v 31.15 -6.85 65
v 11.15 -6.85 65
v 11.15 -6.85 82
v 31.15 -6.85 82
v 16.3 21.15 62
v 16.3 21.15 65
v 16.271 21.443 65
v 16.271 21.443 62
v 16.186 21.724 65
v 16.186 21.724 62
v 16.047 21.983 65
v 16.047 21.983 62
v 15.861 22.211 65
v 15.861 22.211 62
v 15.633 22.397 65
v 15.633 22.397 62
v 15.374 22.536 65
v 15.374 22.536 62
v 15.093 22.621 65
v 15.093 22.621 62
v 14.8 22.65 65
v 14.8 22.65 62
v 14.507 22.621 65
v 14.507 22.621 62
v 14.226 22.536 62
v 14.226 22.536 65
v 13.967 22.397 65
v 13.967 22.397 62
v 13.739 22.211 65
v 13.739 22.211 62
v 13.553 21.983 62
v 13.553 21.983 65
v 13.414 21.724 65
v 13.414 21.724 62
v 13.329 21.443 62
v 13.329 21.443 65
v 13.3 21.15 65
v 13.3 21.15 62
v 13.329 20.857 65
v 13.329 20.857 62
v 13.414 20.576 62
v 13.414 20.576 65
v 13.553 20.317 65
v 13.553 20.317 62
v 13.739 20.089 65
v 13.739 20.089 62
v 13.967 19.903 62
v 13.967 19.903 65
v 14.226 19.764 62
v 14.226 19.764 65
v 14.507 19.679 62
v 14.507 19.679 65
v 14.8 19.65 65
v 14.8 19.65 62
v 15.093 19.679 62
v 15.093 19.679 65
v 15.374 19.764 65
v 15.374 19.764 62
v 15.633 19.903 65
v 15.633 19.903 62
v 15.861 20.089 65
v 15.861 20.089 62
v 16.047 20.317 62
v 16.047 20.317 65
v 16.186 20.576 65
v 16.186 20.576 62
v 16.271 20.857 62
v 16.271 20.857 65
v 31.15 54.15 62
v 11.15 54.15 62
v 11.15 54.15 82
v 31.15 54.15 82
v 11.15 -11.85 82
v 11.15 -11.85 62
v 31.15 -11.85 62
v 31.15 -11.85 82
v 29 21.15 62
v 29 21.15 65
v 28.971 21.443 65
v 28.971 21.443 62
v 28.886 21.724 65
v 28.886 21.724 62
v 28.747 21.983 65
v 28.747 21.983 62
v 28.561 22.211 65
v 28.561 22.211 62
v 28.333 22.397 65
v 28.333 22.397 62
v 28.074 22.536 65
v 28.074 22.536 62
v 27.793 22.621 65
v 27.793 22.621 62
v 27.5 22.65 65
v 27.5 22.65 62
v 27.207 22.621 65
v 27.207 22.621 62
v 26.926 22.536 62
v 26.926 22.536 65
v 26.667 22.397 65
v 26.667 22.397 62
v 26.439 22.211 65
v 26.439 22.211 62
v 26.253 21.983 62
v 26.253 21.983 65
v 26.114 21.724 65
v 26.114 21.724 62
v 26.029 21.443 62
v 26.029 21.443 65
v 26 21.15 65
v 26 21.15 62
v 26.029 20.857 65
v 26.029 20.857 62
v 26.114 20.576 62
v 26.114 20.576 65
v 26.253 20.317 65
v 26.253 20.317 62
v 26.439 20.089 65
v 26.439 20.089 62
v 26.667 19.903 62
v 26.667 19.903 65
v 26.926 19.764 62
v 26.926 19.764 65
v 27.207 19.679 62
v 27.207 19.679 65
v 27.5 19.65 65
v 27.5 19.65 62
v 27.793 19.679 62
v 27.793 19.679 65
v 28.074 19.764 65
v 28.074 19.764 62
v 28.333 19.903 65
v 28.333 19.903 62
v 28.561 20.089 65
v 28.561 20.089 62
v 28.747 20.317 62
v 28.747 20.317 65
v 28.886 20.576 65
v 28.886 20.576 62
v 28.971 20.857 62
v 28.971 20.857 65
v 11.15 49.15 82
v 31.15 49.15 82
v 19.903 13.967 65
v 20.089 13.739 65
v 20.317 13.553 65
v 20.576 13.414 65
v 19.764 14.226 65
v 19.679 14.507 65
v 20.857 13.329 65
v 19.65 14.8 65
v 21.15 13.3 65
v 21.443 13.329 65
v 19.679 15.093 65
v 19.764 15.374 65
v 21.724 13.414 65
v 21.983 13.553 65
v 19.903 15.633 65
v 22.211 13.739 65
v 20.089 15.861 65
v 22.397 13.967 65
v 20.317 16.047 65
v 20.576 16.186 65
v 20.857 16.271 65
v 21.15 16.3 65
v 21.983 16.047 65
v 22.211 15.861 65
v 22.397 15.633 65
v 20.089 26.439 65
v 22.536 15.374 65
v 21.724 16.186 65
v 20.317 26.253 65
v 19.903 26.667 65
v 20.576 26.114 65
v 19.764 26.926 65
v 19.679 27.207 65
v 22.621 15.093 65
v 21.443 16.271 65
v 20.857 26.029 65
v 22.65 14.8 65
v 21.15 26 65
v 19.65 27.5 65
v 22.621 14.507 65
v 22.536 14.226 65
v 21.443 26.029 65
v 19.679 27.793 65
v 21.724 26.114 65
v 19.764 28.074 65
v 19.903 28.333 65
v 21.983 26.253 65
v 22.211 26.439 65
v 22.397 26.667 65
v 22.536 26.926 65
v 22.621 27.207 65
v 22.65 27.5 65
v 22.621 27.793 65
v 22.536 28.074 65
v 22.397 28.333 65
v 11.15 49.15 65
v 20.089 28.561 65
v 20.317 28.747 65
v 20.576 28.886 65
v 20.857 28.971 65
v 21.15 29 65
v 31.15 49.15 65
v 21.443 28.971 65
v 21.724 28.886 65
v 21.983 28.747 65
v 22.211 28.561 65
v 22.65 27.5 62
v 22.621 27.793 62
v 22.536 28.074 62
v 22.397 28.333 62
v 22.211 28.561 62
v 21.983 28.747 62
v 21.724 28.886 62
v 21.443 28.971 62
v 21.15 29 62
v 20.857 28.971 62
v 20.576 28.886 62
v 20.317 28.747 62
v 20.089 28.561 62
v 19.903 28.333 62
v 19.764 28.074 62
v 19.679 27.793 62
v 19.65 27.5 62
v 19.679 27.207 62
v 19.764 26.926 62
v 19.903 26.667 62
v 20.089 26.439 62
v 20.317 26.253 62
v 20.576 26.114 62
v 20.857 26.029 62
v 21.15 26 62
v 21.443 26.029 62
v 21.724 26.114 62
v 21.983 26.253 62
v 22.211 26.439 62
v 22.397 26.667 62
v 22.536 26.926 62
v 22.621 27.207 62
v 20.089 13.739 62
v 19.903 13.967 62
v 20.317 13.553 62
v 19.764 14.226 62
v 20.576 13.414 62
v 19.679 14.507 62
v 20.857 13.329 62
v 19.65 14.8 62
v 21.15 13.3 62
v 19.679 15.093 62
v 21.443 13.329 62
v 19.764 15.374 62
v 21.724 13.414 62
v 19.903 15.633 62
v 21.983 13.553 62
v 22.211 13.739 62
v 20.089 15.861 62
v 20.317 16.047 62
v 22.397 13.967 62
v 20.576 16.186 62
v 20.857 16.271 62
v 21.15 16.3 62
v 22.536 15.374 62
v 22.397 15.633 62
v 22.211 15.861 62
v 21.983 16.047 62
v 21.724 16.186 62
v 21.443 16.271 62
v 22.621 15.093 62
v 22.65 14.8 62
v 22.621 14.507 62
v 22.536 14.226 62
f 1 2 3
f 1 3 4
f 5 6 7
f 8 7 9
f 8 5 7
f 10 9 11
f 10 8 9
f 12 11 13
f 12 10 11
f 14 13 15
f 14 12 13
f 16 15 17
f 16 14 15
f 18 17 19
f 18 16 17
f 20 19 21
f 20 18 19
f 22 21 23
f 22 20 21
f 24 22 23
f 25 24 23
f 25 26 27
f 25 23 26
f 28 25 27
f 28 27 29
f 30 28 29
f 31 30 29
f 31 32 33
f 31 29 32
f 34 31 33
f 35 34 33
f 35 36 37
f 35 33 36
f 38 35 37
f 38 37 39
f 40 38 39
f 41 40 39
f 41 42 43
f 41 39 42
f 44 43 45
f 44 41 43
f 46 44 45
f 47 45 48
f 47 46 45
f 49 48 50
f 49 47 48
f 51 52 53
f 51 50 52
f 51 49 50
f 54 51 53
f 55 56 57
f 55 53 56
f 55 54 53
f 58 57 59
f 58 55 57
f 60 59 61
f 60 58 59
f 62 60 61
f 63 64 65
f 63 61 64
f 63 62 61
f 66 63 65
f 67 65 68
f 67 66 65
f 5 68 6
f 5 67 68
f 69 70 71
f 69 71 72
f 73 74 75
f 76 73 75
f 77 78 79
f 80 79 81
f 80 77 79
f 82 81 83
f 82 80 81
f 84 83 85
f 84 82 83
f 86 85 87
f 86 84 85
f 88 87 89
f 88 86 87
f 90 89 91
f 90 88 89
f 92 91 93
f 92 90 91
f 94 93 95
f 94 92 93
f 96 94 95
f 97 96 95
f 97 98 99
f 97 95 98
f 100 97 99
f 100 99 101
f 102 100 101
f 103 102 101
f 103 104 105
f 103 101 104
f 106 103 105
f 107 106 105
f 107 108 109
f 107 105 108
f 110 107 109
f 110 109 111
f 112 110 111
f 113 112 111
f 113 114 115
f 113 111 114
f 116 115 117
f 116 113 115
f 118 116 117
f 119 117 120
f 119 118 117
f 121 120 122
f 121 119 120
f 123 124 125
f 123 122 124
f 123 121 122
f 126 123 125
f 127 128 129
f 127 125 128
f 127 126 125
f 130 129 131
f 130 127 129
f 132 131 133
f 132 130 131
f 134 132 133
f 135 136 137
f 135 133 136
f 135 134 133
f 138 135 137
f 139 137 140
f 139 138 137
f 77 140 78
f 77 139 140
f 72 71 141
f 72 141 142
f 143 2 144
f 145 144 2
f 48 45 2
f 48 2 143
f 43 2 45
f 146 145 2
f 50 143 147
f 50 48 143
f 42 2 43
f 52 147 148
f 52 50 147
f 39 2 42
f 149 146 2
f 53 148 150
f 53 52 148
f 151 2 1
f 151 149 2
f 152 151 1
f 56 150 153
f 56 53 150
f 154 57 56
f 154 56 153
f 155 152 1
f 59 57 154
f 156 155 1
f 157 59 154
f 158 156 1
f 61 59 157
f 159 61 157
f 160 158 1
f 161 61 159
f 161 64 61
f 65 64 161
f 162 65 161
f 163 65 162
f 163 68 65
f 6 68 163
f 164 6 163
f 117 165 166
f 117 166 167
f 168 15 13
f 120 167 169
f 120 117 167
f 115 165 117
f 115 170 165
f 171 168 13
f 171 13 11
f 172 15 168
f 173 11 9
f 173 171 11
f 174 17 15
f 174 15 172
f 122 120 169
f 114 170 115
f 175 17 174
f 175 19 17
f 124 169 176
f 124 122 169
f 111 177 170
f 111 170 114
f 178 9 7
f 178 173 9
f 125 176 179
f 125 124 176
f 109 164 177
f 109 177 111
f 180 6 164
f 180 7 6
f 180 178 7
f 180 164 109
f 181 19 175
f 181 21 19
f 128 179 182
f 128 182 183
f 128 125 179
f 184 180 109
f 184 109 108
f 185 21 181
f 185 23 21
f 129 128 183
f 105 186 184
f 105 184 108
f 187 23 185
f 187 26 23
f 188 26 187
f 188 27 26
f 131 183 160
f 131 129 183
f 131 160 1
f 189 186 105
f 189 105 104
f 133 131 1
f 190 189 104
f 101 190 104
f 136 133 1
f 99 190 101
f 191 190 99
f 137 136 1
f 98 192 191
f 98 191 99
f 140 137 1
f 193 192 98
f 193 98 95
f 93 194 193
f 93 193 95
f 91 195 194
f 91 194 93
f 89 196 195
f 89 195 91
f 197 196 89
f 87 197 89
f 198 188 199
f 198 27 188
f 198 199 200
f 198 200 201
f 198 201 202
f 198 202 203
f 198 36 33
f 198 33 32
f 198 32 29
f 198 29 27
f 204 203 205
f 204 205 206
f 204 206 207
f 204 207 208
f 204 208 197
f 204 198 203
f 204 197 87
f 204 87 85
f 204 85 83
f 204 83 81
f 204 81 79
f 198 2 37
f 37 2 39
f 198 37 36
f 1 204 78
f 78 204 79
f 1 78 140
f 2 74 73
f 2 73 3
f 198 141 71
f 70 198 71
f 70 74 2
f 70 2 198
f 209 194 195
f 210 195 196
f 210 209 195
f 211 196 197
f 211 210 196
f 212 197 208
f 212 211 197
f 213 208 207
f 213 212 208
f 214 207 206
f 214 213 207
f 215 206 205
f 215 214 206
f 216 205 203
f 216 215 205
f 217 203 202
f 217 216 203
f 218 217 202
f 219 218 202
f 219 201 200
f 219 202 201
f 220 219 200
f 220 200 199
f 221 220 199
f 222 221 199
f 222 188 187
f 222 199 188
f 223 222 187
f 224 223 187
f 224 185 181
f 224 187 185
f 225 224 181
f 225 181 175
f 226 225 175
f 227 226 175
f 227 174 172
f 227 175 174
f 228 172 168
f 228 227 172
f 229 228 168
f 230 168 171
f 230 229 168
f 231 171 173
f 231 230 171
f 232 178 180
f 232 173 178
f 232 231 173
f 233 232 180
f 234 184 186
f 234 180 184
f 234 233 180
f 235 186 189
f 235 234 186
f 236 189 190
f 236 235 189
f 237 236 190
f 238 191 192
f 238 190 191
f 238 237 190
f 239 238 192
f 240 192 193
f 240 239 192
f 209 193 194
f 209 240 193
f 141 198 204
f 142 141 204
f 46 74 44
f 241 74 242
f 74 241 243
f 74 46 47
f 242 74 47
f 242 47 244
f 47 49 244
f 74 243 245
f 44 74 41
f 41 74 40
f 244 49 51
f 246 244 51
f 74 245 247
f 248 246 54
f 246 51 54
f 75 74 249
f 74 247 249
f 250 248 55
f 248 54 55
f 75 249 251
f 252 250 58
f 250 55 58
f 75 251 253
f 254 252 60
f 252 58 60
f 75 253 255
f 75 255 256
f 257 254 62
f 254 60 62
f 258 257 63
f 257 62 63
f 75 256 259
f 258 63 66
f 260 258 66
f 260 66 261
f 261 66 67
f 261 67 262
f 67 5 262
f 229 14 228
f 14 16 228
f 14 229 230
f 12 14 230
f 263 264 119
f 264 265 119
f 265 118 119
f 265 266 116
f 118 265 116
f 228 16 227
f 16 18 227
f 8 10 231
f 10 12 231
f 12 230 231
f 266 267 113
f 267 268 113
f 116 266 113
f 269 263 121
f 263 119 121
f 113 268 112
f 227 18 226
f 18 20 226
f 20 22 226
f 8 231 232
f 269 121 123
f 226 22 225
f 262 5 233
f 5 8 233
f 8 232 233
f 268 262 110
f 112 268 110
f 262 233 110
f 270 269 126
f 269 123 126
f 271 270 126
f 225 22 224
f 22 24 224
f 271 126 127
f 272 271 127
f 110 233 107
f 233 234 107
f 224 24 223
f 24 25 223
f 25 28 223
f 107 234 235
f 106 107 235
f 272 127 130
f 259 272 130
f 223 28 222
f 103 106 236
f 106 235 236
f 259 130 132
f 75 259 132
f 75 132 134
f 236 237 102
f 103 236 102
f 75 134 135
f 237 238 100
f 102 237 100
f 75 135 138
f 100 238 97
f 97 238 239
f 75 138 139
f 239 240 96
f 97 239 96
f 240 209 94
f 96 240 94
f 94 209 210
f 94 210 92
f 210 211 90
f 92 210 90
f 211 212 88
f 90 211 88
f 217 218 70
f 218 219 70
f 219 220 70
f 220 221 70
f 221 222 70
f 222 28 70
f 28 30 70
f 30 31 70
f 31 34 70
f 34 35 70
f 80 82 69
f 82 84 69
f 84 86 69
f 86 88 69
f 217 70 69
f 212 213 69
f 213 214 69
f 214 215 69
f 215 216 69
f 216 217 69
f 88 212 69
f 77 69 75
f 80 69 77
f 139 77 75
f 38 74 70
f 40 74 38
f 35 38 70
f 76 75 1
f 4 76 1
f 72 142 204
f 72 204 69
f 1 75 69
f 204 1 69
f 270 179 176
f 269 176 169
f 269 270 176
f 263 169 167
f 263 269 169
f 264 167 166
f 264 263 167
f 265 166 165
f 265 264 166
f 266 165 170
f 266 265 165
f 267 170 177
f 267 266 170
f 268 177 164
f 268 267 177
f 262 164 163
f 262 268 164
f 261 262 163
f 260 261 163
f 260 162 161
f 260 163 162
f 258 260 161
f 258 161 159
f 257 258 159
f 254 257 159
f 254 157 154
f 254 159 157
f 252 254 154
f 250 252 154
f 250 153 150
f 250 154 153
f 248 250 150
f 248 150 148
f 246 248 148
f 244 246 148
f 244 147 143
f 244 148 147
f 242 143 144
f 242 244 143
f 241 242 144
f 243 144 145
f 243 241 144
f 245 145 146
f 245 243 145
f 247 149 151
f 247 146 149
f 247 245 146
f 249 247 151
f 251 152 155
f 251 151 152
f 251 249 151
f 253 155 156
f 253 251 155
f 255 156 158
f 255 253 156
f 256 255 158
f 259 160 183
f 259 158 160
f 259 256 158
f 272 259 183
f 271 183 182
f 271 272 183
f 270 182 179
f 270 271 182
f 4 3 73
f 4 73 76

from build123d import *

# Parameters (mm, degrees)
CYLINDER002_R     = 1.5
CYLINDER002_DEPTH = 10
CYLINDER003_R     = 1.5
CYLINDER003_DEPTH = 10
CYLINDER004_R     = 1.5
CYLINDER004_DEPTH = 10
CYLINDER001_R     = 1.5
CYLINDER001_DEPTH = 10
BOX003_W          = 20
BOX003_H          = 65
BOX003_DEPTH      = 3
BOX002_W          = 20
BOX002_H          = 5
BOX002_DEPTH      = 20
BOX001_W          = 20
BOX001_H          = 5
BOX001_DEPTH      = 20


with BuildPart() as h2:
    # Cylinder002 → Cylinder002 (new body)
    with BuildSketch(Plane(origin=(16.35, 32.5, 0), x_dir=(1, 0, 0), z_dir=(0, 0, 1))):
        Circle(CYLINDER002_R)
    extrude(amount=CYLINDER002_DEPTH)


with BuildPart() as h3:
    # Cylinder003 → Cylinder003 (new body)
    with BuildSketch(Plane(origin=(10, 38.85, 0), x_dir=(1, 0, 0), z_dir=(0, 0, 1))):
        Circle(CYLINDER003_R)
    extrude(amount=CYLINDER003_DEPTH)


with BuildPart() as h4:
    # Cylinder004 → Cylinder004 (new body)
    with BuildSketch(Plane(origin=(10, 26.15, 0), x_dir=(1, 0, 0), z_dir=(0, 0, 1))):
        Circle(CYLINDER004_R)
    extrude(amount=CYLINDER004_DEPTH)


with BuildPart() as h1:
    # Cylinder001 → Cylinder001 (new body)
    with BuildSketch(Plane(origin=(3.65, 32.5, 0), x_dir=(1, 0, 0), z_dir=(0, 0, 1))):
        Circle(CYLINDER001_R)
    extrude(amount=CYLINDER001_DEPTH)


with BuildPart() as cut003:
    # Box003 → Box003 (new body)
    with BuildSketch(Plane.XY):
        with Locations((10, 32.5)):
            Rectangle(BOX003_W, BOX003_H)
    extrude(amount=BOX003_DEPTH)

    # Cut: cut H1
    add(h1.part, mode=Mode.SUBTRACT)

    # Cut001: cut H4
    add(h4.part, mode=Mode.SUBTRACT)

    # Cut002: cut H3
    add(h3.part, mode=Mode.SUBTRACT)

    # Cut003: cut H2
    add(h2.part, mode=Mode.SUBTRACT)


with BuildPart() as arm2:
    # Box002 → Box002 (new body)
    with BuildSketch(Plane(origin=(0, 60.5, 0), x_dir=(1, 0, 0), z_dir=(0, 0, 1))):
        with Locations((10, 2.5)):
            Rectangle(BOX002_W, BOX002_H)
    extrude(amount=BOX002_DEPTH)


with BuildPart() as gripper:
    # Box001 → Box001 (new body)
    with BuildSketch(Plane(origin=(0, -0.5, 0), x_dir=(1, 0, 0), z_dir=(0, 0, 1))):
        with Locations((10, 2.5)):
            Rectangle(BOX001_W, BOX001_H)
    extrude(amount=BOX001_DEPTH)

    # Fusion001: union Cut003, Arm2
    add(cut003.part)
    add(arm2.part)


with BuildPart() as gripper_1:
    # Fusion001 placement: moved
    add(gripper.part.moved(Location((11.15, -11.35, 62))))


solid = gripper_1.part
